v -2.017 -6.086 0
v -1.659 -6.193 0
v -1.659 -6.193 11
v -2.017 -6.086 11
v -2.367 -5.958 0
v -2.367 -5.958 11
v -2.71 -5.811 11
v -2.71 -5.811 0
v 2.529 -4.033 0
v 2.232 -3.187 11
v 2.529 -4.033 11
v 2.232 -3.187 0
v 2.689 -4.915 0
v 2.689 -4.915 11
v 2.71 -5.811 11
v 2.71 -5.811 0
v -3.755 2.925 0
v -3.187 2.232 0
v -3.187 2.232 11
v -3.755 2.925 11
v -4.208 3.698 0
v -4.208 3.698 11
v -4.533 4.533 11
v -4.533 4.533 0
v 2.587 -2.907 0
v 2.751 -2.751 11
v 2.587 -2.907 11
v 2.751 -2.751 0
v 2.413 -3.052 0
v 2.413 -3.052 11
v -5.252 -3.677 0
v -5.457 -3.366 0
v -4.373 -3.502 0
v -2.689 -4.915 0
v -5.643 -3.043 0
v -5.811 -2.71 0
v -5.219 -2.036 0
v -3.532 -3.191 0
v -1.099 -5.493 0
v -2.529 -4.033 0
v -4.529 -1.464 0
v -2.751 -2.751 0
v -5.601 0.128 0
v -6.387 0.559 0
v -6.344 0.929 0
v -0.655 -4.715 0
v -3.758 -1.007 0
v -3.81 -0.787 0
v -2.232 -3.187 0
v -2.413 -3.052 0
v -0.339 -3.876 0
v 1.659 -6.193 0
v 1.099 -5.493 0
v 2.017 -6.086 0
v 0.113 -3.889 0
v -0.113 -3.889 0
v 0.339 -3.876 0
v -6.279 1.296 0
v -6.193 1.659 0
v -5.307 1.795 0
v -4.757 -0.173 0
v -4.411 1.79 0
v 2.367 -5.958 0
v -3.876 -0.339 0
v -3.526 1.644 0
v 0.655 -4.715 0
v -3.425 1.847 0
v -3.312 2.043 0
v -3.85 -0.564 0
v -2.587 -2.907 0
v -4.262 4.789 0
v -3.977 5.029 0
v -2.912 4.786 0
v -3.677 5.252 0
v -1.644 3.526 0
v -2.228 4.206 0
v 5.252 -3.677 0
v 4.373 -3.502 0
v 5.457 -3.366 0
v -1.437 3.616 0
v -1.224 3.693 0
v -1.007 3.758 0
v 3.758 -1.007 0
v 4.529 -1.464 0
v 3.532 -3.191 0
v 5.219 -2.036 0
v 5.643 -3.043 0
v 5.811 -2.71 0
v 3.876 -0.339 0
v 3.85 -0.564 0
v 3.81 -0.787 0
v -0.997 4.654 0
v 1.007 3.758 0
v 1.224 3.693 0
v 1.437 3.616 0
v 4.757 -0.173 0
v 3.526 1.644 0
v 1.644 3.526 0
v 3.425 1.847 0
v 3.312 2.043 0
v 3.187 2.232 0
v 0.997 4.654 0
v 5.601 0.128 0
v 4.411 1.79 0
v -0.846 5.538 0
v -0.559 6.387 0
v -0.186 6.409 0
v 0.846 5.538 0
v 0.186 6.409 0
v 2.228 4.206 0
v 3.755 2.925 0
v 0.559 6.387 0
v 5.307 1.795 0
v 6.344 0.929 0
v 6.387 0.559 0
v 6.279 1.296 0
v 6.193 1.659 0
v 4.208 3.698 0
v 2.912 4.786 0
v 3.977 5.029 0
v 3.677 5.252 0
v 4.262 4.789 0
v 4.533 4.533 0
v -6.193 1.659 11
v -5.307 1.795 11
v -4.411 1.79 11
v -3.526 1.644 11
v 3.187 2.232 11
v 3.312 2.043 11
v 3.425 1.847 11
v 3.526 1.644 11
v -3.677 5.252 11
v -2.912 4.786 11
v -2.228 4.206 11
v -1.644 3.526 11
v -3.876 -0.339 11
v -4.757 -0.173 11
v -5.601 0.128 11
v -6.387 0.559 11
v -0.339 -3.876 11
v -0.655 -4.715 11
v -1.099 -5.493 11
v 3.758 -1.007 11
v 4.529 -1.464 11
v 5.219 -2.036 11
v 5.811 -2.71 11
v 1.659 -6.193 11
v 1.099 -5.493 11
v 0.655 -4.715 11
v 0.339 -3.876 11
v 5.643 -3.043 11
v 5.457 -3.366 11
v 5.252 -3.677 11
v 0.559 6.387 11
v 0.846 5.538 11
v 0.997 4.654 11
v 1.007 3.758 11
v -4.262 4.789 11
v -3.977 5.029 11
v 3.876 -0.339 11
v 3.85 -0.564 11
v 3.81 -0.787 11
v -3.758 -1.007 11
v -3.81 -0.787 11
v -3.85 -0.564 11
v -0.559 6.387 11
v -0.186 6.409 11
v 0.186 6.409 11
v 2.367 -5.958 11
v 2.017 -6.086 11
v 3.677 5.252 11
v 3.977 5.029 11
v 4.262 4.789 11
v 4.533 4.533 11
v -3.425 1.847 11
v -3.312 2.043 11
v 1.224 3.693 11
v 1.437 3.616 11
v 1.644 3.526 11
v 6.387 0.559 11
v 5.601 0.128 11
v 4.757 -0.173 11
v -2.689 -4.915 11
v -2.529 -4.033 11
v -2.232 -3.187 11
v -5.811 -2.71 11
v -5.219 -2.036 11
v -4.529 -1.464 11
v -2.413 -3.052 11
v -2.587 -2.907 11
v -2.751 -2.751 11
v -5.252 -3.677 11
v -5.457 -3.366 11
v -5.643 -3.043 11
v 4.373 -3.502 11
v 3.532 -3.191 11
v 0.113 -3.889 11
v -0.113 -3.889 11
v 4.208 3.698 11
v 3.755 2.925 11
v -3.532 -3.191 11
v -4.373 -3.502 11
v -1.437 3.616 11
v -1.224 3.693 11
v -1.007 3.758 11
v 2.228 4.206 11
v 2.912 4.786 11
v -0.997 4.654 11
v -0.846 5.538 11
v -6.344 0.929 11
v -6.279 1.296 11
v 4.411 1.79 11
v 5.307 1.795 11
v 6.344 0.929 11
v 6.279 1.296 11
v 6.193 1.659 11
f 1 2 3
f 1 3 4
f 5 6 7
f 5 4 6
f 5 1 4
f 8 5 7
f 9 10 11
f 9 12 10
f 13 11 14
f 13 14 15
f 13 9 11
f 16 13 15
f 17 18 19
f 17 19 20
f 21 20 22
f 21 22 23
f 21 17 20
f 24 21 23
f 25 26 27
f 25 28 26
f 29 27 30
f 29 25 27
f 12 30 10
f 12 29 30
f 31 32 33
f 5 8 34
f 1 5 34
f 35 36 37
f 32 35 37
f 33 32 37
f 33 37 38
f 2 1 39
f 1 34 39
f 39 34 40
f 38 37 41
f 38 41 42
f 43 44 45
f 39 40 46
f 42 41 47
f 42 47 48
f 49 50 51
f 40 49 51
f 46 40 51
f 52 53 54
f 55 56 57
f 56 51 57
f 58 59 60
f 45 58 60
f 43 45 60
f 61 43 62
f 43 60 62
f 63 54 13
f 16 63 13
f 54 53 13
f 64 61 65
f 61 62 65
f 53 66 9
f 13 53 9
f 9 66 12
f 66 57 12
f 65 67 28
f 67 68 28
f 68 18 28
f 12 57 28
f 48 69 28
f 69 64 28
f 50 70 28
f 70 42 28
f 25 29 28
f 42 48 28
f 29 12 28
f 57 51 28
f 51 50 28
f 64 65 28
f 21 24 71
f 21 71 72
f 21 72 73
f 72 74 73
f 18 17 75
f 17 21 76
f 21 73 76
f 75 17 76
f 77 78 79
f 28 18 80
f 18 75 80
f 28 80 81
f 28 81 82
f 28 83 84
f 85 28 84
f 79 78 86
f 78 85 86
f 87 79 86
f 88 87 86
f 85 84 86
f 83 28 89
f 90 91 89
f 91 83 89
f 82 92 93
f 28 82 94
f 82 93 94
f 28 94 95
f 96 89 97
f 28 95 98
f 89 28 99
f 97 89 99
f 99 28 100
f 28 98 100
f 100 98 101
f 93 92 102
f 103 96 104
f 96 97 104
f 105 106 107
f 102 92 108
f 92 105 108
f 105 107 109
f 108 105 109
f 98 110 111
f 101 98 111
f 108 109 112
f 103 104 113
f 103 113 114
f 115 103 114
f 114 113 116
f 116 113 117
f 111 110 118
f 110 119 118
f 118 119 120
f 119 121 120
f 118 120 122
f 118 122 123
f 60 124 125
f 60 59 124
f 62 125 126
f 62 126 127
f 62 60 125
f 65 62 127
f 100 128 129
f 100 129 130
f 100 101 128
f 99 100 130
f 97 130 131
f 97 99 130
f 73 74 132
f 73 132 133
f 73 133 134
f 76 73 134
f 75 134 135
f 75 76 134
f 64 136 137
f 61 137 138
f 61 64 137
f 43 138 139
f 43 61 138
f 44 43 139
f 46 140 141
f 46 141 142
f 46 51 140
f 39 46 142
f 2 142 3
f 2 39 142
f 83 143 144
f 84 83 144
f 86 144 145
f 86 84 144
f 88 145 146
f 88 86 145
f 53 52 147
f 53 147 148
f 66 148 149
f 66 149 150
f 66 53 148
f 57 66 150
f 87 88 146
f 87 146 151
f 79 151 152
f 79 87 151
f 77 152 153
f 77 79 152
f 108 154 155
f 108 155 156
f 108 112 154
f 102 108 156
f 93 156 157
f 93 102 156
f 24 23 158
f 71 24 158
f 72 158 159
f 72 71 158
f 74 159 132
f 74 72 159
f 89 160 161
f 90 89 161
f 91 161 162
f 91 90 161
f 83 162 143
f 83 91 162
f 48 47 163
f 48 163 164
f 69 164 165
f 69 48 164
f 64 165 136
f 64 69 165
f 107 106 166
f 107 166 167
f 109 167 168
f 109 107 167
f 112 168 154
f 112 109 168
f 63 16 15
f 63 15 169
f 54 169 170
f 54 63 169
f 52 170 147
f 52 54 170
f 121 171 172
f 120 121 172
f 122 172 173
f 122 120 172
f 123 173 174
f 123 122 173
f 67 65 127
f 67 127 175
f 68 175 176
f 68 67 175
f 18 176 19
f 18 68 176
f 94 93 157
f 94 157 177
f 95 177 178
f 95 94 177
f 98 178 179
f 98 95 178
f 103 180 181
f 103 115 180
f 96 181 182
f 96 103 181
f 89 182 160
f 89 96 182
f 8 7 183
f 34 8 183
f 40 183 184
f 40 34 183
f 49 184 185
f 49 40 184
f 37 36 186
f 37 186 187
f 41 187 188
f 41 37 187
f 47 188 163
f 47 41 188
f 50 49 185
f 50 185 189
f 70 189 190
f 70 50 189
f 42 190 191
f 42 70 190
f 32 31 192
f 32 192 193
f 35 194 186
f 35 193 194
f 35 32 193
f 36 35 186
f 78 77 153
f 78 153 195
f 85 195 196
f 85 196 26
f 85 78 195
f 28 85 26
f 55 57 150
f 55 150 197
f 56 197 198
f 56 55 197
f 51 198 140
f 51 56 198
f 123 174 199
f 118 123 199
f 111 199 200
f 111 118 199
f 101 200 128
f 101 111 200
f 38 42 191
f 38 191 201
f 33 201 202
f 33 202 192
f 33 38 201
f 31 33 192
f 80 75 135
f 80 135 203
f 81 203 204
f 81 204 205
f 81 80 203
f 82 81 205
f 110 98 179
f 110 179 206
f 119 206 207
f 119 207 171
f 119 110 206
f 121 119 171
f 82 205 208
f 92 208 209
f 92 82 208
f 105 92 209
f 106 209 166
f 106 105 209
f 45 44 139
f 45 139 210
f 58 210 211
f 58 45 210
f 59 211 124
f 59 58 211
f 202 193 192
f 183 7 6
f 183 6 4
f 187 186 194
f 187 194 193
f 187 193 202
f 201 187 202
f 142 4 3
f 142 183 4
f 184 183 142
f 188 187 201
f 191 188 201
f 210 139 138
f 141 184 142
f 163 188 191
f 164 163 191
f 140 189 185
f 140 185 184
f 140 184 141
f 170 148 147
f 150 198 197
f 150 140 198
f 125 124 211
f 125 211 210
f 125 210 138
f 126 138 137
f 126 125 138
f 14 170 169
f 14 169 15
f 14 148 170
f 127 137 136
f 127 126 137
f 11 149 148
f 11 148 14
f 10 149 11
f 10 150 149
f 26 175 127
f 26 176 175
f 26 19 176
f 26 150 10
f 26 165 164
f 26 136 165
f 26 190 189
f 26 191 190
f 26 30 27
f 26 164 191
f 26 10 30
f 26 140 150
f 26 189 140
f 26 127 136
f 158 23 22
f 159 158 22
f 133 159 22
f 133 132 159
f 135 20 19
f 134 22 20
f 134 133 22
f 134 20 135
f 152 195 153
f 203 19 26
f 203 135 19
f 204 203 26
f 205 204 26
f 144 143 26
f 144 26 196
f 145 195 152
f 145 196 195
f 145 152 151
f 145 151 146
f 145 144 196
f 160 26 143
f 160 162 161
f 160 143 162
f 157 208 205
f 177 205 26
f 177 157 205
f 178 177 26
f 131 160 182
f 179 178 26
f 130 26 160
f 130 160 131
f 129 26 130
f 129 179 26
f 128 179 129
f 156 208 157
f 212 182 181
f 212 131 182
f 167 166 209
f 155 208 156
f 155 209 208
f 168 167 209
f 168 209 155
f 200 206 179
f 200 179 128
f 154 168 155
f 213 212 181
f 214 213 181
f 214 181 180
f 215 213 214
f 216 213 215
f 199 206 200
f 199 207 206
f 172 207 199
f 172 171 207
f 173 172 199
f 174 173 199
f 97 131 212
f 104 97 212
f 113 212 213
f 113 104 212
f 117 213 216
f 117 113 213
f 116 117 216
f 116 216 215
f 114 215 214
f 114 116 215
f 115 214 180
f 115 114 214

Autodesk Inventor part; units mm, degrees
sketch "Sketch1" plane through (0, 0, 0) normal (0, 0, 1) x (1, 0, 0)
  circle A0 centre (0, 0) radius 6.4113
  dimension "d0" = 12.8226
extrude "Extrusion1" add sketch "Sketch1" along normal blind 11
ref_plane "Work Plane2" through (0, 0, 5.5) normal (0, 0, 1) x (1, 0, 0)
sketch "Sketch2" plane through (0, 0, 0) normal (0, 0, -1) x (-1, 0, 0)
  circle A0 centre (0, 0) radius 6.4113 projected
  circle A1 centre (0, 0) radius 5.15
  dimension "d3" = 10.3
surface extrude "Pitch Diameter" sketch "Sketch2" against normal through all shown no curves A1
ref_plane "Work Plane8" through (0, 0, 0) normal (0.9396926, 0.3420201, 0) x (0, 0, 1)
ref_plane "Work Plane9" through (0, 0, 0) normal (1, 0, 0) x (0, 1, 0)
spur gear teeth "Spur Gear" teeth 9 pitch diameter 10.125 tip diameter 12.8226 root diameter 7.7817 face width 11 start plane through (0, 0, 0) normal (0, 0, -1) x (-1, 0, 0)
equation "\"d0\" = da_da"
equation "\"d1\" = da_b"
equation "\"d3\" = da_dw"
equation "\"d16\" = da_aw"
equation "\"d43\" = da_aw"
equation "\"d46\" = da_aw"
equation "\"da_da\" = 12.822612"
equation "\"da_b\" = 11"
equation "\"da_dw\" = 10.3"
equation "\"da_aw\" = 10.3"
properties part number "Spur Gear2" material "Steel"
